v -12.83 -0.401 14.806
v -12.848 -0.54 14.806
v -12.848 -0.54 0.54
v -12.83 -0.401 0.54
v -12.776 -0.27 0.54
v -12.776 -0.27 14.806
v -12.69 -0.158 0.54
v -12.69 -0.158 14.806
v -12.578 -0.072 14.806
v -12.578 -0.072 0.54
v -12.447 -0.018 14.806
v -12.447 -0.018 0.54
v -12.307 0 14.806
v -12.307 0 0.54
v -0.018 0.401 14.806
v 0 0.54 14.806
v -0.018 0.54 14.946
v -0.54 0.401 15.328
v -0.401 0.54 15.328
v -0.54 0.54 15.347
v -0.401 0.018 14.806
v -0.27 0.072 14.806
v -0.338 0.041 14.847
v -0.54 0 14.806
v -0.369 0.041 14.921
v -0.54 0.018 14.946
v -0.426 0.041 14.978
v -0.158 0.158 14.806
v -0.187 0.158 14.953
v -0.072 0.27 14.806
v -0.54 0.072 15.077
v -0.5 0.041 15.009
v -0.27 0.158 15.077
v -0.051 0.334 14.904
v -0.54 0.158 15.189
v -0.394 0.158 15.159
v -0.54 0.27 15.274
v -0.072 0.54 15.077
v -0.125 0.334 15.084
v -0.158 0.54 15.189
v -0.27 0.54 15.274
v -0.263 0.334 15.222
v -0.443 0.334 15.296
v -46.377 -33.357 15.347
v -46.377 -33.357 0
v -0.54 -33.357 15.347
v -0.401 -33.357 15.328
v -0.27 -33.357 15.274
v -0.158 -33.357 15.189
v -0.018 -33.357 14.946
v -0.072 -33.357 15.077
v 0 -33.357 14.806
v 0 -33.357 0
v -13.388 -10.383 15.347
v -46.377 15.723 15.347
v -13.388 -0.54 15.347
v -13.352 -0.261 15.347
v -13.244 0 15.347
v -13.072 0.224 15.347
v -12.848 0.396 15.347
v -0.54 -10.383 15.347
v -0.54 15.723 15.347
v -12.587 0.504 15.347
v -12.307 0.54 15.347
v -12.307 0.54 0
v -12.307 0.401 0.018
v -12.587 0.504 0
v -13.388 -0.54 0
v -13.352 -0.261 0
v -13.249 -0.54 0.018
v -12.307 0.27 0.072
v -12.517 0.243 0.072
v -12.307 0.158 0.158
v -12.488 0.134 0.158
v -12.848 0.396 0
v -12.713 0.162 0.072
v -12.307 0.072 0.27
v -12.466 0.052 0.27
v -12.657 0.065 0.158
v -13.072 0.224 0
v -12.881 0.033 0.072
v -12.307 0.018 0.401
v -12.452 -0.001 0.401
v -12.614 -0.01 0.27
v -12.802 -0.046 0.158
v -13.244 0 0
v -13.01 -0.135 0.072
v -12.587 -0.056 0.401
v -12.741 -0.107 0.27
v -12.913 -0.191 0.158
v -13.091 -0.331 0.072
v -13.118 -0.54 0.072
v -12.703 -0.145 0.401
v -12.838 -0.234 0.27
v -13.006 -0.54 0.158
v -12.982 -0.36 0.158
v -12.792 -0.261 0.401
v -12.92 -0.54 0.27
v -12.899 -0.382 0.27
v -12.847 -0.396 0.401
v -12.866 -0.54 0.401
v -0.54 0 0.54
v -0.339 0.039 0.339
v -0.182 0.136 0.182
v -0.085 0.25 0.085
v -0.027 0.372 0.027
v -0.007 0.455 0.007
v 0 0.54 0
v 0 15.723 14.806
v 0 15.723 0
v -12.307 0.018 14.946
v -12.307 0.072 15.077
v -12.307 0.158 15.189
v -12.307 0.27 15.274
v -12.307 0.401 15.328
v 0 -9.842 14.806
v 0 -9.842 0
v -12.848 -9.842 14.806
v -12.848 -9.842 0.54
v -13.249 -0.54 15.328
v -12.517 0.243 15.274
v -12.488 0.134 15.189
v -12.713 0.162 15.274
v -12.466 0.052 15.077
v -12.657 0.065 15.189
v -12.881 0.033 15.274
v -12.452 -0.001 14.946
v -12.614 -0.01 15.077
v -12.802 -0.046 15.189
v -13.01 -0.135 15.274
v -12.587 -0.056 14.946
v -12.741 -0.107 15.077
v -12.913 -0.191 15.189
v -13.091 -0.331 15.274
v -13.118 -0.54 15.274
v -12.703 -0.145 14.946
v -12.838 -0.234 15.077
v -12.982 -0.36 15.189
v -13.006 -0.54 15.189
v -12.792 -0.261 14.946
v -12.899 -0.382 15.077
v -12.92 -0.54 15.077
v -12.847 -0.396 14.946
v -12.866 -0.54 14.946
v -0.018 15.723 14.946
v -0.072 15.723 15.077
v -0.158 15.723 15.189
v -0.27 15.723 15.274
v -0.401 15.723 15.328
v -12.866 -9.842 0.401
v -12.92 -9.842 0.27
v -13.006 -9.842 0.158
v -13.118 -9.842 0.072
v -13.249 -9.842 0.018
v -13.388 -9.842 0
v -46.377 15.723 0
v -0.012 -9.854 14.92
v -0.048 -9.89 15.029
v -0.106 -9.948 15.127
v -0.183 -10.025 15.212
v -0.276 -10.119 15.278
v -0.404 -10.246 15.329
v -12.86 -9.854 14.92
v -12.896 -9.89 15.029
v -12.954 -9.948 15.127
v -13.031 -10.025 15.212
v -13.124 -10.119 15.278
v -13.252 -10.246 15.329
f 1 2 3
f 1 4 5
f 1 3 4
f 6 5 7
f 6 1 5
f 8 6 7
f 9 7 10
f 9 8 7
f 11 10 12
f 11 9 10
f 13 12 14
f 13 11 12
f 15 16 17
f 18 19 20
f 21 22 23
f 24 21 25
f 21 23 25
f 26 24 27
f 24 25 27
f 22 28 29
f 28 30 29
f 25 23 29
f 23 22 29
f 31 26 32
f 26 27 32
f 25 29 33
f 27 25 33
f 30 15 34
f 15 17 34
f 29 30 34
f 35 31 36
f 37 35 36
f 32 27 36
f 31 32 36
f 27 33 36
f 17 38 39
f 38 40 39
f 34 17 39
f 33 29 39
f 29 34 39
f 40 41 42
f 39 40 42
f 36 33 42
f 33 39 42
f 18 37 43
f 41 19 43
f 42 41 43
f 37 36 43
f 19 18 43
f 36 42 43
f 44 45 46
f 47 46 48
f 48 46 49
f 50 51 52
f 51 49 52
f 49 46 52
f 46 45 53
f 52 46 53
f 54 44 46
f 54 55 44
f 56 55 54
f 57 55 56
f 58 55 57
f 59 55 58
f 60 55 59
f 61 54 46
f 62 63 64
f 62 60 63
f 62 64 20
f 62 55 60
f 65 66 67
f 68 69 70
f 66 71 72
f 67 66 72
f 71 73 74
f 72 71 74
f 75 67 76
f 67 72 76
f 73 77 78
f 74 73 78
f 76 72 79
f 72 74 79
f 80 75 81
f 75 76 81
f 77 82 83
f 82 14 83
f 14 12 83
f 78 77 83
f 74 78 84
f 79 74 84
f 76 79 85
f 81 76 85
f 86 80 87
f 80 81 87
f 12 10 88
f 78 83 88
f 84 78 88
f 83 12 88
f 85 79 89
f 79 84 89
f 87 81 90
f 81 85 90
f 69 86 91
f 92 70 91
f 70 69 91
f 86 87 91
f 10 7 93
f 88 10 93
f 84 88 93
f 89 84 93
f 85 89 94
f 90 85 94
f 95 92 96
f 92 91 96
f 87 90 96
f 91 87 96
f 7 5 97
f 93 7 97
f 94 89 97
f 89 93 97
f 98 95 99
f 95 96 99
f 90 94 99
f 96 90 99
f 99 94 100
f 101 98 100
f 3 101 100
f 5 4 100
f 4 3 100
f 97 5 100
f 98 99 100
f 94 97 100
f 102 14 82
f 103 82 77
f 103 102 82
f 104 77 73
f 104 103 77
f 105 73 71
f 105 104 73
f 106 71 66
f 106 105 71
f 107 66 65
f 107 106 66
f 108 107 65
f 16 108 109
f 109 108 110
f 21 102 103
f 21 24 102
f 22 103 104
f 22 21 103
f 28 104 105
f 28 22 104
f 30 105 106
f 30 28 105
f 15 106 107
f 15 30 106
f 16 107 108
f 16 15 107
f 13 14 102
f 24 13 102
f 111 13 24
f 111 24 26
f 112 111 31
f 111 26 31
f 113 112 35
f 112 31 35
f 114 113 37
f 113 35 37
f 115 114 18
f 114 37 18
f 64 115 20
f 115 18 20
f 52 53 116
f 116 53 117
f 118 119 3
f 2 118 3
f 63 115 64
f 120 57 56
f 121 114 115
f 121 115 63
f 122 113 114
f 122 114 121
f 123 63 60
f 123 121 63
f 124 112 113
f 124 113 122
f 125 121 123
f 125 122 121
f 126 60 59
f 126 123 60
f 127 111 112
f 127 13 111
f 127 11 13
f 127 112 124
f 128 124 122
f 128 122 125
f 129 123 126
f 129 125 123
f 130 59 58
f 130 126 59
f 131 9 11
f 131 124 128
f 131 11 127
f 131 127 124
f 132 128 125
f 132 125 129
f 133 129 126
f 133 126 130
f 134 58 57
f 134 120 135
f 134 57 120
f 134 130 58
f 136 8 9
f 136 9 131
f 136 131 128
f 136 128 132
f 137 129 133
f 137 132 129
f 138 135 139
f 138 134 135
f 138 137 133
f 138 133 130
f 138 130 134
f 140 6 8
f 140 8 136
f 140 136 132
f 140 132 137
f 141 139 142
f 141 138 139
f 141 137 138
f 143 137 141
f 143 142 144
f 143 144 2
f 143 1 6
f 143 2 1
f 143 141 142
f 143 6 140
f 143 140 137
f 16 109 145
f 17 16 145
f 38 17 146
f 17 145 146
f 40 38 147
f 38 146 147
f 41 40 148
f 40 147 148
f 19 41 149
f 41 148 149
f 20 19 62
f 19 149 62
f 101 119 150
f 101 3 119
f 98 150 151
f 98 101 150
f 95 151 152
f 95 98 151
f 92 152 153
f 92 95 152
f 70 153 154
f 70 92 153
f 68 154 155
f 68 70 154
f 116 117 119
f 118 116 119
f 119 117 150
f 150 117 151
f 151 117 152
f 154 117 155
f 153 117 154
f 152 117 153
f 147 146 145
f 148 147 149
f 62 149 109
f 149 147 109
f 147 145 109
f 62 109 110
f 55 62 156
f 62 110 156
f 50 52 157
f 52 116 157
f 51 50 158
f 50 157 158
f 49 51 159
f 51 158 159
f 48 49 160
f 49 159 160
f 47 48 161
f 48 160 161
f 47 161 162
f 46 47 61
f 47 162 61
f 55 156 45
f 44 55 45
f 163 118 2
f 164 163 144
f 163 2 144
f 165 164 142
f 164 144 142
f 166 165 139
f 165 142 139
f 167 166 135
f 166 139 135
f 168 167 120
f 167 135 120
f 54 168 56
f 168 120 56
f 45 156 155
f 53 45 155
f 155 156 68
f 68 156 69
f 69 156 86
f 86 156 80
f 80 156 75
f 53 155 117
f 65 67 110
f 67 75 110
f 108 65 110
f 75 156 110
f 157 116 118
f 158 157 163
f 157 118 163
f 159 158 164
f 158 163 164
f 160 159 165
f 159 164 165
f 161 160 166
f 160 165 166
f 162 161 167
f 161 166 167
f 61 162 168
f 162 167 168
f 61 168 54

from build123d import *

# Parameters (mm, degrees)
F1_DEPTH = 15.3468120843
F2_R     = 0.540493976


with BuildPart() as f1:
    # F0 (on Top) → F1 (new body)
    with BuildSketch(Plane.XY):
        Polygon((-46.3772900403, 15.7230943441), (-46.3772900403, -33.35686028), (0, -33.35686028), (0, -9.8423212767), (-12.8479711711, -9.8423212767), (-12.8479711711, 0), (0, 0), (0, 15.7230943441), align=None)
    extrude(amount=F1_DEPTH)

    # F2
    f2_edges = [f1.edges().sort_by_distance(p)[0] for p in [
        (0, -21.599591, 15.346812),
        (0, 7.861547, 15.346812),
        (-12.847971, -4.921161, 15.346812),
        (-6.423986, -9.842321, 15.346812),
        (-12.847971, 0, 7.673406),
        (0, 0, 7.673406),
        (-6.423986, 0, 0),
        (-6.423986, 0, 15.346812),
        (-12.847971, -4.921161, 0),
    ]]
    fillet(f2_edges, radius=F2_R)


solid = f1.part
